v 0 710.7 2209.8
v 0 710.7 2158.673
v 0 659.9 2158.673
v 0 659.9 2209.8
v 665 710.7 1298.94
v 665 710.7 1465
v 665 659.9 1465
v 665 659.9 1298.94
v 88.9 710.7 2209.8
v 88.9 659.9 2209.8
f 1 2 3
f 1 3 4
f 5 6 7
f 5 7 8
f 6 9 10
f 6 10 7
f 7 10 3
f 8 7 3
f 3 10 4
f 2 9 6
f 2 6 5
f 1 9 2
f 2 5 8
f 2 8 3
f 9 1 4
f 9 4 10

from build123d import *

# Parameters (mm, degrees)
BOSS_EXTRUDE1_DEPTH = 50.8


with BuildPart() as part:
    # Sketch2 → Boss-Extrude1 (new body)
    with BuildSketch(Plane.XZ.offset(-710.7)):
        Polygon((665, 1298.940331748), (0, 2158.673017045), (0, 2209.8), (88.9, 2209.8), (665, 1465), align=None)
    extrude(amount=BOSS_EXTRUDE1_DEPTH)


solid = part.part
